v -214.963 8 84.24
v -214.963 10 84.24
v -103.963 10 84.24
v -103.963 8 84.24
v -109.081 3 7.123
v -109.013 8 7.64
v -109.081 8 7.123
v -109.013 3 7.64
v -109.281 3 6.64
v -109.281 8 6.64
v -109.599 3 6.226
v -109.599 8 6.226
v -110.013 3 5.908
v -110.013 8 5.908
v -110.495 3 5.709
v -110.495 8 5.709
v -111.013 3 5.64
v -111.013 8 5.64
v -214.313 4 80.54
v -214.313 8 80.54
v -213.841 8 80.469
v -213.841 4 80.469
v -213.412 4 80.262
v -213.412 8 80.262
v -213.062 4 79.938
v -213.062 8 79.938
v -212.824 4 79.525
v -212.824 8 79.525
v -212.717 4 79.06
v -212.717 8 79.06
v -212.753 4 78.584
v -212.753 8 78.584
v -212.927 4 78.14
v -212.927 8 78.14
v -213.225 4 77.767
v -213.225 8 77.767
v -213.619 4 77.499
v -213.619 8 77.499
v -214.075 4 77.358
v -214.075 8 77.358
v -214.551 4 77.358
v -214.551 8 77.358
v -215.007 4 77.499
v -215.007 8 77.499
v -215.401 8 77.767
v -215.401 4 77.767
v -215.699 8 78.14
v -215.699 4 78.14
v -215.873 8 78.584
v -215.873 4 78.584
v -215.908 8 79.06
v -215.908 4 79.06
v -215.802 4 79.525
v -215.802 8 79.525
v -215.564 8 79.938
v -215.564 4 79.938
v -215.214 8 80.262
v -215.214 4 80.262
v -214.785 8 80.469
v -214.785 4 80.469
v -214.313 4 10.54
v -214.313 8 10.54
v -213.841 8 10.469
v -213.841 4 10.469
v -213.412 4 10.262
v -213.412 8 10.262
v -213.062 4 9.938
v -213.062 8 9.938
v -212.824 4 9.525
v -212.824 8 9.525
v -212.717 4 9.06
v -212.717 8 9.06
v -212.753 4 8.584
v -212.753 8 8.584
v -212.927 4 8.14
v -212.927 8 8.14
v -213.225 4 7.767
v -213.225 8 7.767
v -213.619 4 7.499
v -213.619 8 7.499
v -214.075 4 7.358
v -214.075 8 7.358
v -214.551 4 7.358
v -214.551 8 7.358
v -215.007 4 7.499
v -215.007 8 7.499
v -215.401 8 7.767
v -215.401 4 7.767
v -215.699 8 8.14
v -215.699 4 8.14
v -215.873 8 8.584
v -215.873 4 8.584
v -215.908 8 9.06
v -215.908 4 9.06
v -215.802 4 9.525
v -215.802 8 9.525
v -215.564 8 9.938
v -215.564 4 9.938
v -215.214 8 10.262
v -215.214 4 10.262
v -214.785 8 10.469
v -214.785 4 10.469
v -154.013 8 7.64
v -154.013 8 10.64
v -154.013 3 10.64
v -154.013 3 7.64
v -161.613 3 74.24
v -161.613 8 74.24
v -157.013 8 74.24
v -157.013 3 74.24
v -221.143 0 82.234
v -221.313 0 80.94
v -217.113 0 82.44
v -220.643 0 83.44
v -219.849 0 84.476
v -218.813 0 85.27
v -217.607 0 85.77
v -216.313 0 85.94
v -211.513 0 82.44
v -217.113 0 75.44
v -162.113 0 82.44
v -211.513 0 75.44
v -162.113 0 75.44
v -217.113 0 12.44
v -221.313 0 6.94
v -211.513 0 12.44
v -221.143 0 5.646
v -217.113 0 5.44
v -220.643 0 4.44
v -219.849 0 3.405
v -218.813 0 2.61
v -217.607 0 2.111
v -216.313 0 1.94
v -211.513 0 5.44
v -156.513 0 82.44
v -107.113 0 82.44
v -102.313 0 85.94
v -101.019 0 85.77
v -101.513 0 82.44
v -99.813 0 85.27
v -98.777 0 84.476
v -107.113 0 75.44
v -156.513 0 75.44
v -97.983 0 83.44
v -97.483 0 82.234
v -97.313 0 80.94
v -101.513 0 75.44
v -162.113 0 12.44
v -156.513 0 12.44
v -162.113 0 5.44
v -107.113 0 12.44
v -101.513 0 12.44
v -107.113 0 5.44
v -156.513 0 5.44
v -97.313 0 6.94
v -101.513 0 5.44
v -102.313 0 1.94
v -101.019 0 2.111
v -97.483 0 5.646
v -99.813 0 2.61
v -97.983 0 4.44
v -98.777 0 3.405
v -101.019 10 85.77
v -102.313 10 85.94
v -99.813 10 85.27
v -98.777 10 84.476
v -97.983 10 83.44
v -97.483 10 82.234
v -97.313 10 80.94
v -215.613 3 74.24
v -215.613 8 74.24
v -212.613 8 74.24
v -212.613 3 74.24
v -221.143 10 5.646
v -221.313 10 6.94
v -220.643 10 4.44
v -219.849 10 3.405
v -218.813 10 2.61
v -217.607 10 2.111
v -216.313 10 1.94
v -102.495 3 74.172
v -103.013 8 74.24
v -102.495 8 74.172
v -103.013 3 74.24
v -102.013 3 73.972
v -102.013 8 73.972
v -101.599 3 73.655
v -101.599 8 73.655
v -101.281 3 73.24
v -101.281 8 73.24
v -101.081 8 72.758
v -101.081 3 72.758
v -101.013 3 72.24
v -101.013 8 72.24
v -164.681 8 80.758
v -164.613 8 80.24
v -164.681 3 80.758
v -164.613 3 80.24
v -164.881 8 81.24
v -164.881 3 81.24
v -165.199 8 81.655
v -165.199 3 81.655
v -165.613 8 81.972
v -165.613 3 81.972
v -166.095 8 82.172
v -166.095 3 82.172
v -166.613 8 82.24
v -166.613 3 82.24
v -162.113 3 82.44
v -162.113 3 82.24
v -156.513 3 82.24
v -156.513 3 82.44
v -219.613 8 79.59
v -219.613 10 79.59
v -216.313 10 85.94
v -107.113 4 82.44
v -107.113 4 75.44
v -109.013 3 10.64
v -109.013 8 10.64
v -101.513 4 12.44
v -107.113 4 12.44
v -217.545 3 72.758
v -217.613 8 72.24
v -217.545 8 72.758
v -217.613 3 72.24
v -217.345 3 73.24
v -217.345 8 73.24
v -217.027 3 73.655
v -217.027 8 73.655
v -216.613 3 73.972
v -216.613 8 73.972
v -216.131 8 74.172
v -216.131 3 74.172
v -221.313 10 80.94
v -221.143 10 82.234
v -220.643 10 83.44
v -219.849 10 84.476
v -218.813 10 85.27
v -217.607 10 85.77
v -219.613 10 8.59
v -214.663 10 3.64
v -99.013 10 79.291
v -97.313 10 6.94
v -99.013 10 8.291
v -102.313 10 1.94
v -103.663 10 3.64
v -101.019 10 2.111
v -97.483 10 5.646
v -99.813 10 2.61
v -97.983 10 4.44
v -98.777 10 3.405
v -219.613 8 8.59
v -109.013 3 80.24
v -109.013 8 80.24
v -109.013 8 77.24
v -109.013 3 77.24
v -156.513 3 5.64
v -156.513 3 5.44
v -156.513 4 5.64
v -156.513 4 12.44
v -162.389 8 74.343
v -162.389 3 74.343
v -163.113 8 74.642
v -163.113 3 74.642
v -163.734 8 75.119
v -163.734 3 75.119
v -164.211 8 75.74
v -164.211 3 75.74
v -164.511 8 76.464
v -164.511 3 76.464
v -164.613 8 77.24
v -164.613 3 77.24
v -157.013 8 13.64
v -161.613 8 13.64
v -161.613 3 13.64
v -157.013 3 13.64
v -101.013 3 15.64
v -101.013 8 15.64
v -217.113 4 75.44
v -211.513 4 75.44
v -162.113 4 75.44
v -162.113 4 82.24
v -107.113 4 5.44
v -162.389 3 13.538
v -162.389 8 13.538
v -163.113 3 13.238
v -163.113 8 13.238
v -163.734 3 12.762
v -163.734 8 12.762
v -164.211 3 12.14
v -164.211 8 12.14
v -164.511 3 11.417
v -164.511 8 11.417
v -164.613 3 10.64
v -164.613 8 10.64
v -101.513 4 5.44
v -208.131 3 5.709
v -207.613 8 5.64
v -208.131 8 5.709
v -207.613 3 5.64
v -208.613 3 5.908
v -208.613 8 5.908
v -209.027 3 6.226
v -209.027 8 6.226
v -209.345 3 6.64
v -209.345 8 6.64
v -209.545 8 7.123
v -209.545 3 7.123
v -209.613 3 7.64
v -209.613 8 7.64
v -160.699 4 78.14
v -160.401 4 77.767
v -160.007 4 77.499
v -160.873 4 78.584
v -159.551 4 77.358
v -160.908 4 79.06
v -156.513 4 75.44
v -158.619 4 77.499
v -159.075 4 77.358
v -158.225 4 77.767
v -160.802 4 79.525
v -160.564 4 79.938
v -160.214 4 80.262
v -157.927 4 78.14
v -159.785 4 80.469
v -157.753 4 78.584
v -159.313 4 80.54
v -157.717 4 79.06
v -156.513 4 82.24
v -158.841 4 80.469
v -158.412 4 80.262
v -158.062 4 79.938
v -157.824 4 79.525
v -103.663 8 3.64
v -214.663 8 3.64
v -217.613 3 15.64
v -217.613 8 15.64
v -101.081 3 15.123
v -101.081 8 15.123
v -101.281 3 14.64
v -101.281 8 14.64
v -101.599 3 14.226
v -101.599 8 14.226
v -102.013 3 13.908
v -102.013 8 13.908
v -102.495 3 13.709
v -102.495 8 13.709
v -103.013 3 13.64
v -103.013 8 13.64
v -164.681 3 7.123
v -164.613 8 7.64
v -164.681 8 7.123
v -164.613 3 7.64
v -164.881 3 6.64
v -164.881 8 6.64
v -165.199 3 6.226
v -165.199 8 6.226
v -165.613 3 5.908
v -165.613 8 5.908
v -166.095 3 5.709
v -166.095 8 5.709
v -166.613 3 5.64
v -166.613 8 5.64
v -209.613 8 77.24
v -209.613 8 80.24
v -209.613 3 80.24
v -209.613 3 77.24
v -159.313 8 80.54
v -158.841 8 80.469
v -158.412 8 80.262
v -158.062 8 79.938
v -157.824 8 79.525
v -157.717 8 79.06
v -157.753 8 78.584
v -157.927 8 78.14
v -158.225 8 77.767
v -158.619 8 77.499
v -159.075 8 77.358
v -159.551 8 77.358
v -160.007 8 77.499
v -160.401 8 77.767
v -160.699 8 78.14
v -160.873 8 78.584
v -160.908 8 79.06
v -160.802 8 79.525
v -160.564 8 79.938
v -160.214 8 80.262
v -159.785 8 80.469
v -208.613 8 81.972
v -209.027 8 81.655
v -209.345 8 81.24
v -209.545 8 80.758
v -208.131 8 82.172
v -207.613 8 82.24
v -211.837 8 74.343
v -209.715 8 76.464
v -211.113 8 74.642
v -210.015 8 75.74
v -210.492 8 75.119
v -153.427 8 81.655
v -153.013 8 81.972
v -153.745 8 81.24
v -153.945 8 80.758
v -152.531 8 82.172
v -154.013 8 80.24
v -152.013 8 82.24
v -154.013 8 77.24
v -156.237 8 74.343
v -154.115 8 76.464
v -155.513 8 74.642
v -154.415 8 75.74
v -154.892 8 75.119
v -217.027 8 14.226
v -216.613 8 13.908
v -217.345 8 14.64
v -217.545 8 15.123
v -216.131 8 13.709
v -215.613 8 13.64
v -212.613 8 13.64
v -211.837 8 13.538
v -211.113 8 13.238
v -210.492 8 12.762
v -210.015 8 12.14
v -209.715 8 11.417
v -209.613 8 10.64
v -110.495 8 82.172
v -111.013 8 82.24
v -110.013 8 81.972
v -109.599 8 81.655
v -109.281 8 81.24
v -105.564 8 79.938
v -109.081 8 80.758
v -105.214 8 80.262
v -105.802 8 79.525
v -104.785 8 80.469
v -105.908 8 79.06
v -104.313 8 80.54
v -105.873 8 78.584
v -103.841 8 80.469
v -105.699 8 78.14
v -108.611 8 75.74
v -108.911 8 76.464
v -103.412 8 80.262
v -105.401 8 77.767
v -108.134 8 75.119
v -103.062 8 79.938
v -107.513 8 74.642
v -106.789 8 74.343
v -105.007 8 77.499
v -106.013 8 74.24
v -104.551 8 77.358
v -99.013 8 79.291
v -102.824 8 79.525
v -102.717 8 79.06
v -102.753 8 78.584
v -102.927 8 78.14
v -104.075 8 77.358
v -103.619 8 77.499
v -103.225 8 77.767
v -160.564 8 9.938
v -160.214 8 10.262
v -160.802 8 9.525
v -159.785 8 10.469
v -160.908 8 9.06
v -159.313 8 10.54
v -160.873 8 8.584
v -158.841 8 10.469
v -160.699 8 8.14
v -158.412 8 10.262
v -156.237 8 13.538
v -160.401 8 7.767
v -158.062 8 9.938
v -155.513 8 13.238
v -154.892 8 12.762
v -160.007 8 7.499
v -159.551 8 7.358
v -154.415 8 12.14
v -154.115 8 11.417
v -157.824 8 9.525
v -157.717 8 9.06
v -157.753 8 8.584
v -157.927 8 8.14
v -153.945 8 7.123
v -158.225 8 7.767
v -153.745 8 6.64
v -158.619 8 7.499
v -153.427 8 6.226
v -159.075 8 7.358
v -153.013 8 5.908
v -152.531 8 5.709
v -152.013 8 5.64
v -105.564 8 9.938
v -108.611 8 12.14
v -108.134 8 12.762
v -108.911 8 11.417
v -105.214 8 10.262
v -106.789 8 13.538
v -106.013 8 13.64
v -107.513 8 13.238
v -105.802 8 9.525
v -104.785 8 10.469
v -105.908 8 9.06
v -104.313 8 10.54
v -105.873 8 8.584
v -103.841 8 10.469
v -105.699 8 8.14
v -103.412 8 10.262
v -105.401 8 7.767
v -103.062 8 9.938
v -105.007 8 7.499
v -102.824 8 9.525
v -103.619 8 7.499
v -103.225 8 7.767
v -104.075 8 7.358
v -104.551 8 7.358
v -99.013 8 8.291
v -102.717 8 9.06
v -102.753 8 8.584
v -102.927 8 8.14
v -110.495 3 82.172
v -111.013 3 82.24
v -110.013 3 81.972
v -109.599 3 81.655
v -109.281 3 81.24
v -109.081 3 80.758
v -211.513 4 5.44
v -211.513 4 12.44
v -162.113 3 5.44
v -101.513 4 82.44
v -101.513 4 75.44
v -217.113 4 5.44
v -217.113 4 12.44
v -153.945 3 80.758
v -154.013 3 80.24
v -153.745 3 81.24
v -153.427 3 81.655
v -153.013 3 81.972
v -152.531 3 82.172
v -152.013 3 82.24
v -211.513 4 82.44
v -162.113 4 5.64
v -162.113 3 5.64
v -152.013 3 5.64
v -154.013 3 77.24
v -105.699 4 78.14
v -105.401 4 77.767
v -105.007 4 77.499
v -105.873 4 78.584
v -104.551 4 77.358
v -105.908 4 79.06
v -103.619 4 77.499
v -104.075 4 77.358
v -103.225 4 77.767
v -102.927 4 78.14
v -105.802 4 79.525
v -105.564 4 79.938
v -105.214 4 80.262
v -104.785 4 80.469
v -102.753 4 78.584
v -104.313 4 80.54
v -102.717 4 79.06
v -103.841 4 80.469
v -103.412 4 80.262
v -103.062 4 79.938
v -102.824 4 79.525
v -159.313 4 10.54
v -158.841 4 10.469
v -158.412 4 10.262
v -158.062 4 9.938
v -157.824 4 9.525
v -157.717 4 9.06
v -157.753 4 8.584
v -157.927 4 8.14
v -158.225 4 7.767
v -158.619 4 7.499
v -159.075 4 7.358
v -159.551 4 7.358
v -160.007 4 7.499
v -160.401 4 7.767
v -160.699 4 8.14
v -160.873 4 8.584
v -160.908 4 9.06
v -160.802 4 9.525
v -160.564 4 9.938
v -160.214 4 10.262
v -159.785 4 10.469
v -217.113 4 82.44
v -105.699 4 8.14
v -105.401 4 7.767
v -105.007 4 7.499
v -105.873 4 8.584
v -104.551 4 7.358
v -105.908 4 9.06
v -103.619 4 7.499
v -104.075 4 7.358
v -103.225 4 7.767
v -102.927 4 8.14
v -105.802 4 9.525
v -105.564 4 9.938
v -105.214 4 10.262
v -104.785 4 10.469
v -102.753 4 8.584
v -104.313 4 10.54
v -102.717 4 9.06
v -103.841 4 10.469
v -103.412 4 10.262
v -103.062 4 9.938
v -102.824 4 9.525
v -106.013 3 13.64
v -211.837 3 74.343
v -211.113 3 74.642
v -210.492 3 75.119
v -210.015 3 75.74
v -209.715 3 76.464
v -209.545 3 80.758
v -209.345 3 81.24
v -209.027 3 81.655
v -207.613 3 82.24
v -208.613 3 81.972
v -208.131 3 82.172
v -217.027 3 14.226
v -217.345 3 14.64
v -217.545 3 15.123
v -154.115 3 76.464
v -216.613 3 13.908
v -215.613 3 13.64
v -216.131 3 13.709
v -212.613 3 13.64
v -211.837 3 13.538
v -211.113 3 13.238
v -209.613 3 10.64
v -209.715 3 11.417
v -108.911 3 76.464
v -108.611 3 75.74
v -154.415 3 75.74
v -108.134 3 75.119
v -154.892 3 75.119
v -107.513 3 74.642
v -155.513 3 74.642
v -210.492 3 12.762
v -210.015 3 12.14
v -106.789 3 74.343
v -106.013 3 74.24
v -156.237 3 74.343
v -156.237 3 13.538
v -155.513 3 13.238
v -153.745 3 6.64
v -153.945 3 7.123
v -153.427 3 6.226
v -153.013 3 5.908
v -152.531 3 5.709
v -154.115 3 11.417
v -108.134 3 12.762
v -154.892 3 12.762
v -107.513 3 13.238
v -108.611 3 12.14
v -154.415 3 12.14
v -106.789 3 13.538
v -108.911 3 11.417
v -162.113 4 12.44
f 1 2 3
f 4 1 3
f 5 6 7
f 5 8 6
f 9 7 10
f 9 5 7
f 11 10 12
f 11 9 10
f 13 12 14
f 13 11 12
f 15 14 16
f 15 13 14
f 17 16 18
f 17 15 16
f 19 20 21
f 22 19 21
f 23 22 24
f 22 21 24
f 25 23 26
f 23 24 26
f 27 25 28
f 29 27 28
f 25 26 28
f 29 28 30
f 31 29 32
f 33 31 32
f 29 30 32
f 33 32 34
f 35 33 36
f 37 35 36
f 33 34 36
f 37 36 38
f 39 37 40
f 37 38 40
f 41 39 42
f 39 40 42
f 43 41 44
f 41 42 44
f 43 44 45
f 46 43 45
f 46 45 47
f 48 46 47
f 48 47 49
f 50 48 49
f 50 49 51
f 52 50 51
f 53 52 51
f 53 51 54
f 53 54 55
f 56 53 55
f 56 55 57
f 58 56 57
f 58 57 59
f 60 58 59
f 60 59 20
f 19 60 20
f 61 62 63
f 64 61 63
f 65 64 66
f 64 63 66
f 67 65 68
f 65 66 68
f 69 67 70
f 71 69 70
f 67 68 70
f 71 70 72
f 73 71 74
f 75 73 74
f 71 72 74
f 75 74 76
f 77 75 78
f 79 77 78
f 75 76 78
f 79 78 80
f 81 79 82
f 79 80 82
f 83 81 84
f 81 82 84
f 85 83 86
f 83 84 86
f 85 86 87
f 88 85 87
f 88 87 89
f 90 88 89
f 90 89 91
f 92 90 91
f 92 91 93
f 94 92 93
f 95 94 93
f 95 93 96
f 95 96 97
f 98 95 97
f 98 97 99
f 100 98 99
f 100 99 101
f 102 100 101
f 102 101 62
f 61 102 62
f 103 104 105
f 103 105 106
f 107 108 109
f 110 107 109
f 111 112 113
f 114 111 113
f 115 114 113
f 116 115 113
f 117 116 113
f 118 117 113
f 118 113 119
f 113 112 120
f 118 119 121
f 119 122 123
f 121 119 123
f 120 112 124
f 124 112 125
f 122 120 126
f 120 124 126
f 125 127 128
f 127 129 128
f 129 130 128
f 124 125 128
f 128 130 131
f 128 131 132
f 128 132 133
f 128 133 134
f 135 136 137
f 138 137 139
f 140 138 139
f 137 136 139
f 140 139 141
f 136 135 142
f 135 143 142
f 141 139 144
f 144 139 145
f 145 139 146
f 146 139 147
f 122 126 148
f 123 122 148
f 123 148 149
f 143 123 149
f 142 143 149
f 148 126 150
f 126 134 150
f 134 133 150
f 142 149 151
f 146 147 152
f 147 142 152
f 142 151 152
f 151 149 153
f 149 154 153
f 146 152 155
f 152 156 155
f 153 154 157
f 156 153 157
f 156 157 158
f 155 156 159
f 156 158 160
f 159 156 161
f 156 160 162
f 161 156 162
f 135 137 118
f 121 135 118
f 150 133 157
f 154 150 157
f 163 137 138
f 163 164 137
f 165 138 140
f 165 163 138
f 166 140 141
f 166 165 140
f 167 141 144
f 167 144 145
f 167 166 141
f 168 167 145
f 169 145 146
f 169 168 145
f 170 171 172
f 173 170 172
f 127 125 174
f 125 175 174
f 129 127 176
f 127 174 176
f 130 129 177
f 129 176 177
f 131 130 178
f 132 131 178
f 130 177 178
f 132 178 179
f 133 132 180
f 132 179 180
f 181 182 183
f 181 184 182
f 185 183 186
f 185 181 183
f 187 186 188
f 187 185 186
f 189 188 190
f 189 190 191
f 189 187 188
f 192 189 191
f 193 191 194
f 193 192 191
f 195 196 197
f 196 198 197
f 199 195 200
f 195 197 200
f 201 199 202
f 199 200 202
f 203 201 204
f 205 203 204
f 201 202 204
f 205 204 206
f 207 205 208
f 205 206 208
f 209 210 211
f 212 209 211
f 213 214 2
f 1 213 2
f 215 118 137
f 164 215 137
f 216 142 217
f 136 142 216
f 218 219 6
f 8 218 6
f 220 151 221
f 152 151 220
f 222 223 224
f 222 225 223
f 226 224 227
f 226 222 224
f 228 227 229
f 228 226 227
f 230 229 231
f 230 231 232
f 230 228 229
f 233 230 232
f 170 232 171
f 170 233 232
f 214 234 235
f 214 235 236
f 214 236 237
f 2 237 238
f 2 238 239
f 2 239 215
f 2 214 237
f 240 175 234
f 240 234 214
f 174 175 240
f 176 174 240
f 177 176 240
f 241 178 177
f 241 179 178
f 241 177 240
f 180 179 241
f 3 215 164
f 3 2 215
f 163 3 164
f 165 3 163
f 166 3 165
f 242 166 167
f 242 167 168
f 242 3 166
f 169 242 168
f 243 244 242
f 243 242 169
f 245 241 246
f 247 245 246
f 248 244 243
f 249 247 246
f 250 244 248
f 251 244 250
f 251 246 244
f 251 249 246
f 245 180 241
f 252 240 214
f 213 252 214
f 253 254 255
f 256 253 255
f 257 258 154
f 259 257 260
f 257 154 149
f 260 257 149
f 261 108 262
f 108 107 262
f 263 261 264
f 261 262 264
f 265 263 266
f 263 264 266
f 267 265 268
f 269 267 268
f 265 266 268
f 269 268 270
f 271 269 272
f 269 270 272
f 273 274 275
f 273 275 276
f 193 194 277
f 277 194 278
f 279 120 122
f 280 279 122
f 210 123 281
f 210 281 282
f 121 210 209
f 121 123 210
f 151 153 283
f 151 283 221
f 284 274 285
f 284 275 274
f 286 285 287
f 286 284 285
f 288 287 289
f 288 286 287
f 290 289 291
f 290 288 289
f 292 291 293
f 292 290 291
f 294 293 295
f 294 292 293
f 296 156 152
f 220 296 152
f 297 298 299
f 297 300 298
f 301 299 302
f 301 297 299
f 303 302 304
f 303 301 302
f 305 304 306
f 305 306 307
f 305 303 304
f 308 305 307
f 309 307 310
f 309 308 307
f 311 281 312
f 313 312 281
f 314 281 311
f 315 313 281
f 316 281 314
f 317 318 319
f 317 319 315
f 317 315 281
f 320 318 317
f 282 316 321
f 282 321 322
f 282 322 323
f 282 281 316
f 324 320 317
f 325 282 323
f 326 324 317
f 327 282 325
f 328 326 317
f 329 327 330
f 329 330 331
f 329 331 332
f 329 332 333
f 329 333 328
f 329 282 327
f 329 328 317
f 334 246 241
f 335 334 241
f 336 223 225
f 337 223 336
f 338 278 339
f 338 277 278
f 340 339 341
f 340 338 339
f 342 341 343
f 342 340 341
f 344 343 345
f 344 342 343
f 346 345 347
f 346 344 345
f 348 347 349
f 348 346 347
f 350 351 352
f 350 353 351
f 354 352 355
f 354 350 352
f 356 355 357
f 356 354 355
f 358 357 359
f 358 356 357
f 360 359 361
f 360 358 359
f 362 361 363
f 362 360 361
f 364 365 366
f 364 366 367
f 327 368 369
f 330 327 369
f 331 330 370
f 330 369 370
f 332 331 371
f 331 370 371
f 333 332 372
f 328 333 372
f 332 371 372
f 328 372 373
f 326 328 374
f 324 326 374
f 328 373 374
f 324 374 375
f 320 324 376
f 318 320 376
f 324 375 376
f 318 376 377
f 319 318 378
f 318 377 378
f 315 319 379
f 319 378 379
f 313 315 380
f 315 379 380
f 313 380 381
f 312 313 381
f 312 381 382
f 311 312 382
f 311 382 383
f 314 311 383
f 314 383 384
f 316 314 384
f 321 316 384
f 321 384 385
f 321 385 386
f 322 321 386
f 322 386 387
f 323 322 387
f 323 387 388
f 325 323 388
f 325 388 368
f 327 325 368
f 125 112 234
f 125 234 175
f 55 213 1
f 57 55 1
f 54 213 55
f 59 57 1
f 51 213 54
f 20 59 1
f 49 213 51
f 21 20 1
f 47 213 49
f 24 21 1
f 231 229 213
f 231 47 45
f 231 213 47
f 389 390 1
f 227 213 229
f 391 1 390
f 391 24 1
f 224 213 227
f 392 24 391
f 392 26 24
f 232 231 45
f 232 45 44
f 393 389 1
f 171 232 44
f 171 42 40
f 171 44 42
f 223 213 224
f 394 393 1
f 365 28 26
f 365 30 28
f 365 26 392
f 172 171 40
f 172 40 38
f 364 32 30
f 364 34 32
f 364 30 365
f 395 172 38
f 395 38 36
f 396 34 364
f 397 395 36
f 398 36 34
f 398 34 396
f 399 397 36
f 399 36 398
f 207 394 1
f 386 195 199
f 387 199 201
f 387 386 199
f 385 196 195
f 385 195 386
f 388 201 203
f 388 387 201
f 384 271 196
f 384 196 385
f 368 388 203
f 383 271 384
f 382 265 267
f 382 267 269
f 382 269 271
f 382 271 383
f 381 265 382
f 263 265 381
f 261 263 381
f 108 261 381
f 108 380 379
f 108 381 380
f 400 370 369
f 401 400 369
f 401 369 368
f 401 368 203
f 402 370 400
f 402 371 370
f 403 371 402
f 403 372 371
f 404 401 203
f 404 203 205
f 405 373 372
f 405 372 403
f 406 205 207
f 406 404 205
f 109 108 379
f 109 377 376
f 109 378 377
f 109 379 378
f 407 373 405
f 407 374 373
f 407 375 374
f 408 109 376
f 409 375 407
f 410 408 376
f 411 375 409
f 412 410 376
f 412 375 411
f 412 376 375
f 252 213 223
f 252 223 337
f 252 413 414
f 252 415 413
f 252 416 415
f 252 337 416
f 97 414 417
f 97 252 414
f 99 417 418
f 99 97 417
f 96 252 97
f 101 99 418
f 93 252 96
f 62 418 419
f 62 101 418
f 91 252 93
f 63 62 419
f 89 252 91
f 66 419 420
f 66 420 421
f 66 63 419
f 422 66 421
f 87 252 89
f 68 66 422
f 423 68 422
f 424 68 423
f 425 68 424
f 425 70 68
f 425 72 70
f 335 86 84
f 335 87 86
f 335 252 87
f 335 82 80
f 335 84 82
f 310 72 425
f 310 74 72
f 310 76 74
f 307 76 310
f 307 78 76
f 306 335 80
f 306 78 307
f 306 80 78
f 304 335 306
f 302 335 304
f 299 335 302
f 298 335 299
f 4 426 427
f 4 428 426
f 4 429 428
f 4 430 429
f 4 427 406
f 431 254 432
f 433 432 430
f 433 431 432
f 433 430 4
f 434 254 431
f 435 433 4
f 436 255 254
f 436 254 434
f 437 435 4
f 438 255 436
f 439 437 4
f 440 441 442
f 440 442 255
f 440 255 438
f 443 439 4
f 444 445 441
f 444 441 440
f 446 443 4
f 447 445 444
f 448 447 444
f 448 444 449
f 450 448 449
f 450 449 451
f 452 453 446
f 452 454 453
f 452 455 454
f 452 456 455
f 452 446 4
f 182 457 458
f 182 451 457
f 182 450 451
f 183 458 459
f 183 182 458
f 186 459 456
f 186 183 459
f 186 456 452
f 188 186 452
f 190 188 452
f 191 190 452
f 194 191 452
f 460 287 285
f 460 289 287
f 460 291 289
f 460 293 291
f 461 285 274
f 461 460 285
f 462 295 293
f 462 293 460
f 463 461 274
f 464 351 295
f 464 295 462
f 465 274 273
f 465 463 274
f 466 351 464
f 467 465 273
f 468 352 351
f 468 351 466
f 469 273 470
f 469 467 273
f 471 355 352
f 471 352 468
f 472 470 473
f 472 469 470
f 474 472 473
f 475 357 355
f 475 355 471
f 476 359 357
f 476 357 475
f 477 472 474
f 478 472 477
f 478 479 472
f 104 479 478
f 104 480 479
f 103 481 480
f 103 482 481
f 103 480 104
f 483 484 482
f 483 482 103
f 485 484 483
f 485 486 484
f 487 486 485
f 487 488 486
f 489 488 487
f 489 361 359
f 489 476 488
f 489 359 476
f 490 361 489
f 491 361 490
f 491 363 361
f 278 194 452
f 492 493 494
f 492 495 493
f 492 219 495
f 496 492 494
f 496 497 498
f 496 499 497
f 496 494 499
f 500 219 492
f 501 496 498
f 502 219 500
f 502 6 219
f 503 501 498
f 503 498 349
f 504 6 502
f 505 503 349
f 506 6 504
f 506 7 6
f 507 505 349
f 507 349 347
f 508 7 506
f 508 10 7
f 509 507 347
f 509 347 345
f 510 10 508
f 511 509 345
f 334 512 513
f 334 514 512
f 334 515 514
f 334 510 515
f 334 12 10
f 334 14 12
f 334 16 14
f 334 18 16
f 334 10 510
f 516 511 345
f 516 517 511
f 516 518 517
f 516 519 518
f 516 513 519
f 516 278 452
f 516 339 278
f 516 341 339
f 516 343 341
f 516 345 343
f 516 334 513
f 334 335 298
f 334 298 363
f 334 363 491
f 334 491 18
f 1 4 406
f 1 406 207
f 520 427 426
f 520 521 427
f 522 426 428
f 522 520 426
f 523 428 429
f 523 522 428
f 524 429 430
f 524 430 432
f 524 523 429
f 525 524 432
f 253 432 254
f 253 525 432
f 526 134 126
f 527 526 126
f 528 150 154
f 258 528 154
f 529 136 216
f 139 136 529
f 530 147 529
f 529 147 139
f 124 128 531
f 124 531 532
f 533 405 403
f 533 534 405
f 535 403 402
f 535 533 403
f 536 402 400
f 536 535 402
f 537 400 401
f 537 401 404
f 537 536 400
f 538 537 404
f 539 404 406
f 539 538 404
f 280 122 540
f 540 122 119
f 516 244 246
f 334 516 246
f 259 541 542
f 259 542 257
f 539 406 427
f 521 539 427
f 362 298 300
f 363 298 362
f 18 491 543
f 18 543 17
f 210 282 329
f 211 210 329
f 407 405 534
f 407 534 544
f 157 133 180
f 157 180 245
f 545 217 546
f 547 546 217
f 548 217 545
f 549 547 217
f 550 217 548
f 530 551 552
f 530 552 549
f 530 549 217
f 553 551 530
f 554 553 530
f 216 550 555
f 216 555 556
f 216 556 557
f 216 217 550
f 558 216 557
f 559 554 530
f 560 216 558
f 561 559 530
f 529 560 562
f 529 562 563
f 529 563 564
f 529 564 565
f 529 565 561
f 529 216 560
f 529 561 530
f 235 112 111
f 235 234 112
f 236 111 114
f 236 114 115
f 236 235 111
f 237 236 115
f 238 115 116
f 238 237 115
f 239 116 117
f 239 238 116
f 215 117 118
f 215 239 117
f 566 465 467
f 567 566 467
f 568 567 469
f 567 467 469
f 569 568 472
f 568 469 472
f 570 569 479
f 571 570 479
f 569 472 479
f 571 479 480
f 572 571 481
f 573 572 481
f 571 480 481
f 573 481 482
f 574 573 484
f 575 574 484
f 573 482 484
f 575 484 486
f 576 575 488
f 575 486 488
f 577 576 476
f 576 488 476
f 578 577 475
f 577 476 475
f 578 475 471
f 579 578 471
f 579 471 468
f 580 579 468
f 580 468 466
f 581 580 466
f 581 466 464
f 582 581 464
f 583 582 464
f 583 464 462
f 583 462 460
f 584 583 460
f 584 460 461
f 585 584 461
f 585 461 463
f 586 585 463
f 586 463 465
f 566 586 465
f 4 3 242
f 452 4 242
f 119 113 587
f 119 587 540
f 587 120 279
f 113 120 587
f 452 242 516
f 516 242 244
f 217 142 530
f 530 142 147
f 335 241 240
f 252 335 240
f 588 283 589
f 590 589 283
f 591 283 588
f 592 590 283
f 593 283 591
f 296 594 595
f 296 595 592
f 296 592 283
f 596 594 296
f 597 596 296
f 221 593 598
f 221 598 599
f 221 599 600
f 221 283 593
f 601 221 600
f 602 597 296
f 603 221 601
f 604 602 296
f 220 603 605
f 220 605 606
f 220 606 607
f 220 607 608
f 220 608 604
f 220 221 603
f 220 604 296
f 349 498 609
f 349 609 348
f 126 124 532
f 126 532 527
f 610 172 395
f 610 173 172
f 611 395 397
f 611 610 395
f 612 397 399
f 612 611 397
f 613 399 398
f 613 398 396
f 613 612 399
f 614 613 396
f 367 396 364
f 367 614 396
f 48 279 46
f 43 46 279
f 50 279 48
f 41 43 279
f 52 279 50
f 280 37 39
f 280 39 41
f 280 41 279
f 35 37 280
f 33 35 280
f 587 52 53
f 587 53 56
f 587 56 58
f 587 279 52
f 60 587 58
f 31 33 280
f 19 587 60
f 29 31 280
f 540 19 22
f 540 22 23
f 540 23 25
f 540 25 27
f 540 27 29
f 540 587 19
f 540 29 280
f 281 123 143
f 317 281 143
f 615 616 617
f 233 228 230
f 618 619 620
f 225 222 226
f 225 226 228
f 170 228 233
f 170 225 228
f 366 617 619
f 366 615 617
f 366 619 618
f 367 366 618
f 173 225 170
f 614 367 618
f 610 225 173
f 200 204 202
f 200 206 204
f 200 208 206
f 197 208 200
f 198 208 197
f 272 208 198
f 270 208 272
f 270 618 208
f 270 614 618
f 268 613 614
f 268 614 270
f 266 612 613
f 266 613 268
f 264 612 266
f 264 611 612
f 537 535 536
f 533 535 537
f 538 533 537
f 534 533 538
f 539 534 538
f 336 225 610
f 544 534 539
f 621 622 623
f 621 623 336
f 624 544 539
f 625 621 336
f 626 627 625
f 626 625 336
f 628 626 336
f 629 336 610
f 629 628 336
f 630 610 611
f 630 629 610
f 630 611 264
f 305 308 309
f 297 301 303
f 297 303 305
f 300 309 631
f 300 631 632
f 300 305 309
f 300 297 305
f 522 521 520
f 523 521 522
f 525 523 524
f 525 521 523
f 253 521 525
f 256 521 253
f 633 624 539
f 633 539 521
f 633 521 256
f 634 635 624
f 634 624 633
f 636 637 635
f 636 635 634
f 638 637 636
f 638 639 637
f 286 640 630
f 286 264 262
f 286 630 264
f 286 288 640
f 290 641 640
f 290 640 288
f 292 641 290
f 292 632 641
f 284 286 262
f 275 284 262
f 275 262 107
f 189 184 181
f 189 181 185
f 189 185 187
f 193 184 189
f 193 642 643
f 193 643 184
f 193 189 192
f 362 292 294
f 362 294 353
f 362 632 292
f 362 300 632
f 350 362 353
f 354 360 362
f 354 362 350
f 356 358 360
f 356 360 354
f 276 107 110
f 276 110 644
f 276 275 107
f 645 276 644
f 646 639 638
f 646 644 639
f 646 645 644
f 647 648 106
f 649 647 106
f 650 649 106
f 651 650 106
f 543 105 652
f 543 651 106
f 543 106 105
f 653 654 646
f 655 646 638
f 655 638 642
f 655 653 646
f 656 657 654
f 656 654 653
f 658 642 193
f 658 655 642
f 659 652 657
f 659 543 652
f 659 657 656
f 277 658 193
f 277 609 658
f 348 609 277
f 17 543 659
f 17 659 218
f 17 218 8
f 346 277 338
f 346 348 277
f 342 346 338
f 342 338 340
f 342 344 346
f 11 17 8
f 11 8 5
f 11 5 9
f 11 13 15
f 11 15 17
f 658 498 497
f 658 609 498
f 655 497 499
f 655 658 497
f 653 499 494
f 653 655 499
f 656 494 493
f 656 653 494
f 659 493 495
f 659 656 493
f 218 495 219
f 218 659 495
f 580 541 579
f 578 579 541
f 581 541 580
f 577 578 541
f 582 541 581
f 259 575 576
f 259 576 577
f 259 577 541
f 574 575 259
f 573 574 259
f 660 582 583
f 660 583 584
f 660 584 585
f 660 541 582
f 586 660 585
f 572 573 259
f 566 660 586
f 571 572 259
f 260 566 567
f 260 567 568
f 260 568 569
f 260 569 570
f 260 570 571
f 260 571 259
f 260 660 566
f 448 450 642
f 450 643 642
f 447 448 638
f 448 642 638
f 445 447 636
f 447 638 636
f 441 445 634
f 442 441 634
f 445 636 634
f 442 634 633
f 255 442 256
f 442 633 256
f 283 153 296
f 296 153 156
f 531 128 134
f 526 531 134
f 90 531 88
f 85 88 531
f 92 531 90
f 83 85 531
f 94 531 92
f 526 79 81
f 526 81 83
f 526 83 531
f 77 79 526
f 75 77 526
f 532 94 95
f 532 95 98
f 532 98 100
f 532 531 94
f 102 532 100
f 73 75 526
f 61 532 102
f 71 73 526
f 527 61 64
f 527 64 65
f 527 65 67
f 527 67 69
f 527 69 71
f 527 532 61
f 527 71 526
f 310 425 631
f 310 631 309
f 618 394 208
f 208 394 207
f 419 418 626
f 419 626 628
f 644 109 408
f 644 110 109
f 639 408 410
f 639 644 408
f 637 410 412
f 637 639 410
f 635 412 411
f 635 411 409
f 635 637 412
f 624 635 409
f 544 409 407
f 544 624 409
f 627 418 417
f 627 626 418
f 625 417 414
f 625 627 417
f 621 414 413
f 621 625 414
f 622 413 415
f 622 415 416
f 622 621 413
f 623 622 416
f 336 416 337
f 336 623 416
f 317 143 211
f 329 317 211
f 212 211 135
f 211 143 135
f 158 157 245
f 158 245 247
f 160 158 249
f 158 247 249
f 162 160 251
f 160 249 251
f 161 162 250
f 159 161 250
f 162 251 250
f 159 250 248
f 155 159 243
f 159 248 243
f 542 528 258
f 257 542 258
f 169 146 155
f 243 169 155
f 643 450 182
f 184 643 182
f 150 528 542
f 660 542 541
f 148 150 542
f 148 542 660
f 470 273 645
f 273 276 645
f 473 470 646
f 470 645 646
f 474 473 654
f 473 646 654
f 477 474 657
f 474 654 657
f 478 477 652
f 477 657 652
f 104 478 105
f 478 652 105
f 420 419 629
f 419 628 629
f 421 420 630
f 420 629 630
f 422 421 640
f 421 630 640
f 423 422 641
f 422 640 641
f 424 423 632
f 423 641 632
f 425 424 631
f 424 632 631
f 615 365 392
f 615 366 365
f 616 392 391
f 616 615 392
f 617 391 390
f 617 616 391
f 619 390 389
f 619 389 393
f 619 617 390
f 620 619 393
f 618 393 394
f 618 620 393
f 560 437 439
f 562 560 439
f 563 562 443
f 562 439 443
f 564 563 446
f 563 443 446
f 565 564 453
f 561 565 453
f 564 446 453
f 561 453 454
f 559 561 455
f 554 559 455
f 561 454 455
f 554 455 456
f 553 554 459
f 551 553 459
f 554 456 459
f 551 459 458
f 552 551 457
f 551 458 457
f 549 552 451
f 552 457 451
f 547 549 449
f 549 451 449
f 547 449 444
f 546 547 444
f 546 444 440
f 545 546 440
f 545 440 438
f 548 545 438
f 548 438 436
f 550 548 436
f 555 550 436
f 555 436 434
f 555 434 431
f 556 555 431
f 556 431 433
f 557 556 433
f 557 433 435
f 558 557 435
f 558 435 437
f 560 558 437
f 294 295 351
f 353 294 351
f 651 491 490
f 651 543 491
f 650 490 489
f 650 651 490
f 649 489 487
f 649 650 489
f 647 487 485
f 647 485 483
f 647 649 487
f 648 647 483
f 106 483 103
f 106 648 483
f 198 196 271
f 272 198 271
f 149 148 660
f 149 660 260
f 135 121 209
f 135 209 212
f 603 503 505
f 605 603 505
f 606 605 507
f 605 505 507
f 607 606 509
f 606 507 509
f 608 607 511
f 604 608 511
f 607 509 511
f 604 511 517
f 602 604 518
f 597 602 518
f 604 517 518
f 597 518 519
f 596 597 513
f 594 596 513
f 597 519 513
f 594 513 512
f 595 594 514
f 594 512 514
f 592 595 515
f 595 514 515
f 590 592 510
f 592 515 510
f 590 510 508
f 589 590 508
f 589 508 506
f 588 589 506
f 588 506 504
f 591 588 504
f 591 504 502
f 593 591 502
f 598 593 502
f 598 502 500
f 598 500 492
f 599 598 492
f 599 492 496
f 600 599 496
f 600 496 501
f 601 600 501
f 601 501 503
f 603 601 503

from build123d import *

# Parameters (mm, degrees)
SKETCH1_W           = 124
SKETCH1_H           = 84
BOSS_EXTRUDE1_DEPTH = 10
CUT_EXTRUDE1_DEPTH  = 2
SKETCH3_W           = 120.6
SKETCH3_H           = 60.6
CUT_EXTRUDE2_DEPTH  = 5
SKETCH4_W           = 45
SKETCH4_H           = 10
CUT_EXTRUDE3_DEPTH  = 5
FILLET1_R           = 3
FILLET2_R           = 5
SKETCH5_R           = 1.6
CUT_EXTRUDE4_DEPTH  = 238.548265663
SKETCH7_W           = 5.6
SKETCH7_H           = 7
CUT_EXTRUDE5_DEPTH  = 4
SKETCH8_W           = 100.6
SKETCH8_H           = 2
SKETCH8_W_2         = 2
SKETCH8_H_2         = 60.6
BOSS_EXTRUDE2_DEPTH = 5
FILLET3_R           = 2


with BuildPart() as part:
    # Sketch1 → Boss-Extrude1 (new body)
    with BuildSketch(Plane(origin=(0, 0, 0), x_dir=(1, 0, 0), z_dir=(0, 1, 0))):
        with Locations((-159.312972905, -43.940366204)):
            Rectangle(SKETCH1_W, SKETCH1_H)
    extrude(amount=BOSS_EXTRUDE1_DEPTH)

    # Sketch2 → Cut-Extrude1 (cut)
    with BuildSketch(Plane(origin=(0, 10, 0), x_dir=(1, 0, 0), z_dir=(0, 1, 0))):
        Polygon((-214.663225437, -3.640366204), (-219.612972905, -8.590113673), (-219.612972905, -79.590113673), (-214.962720373, -84.240366204), (-103.962720373, -84.240366204), (-99.012972905, -79.290618736), (-99.012972905, -8.290618736), (-103.663225437, -3.640366204), align=None)
    extrude(amount=-CUT_EXTRUDE1_DEPTH, mode=Mode.SUBTRACT)

    # Sketch3 → Cut-Extrude2 (cut)
    with BuildSketch(Plane(origin=(0, 8, 0), x_dir=(1, 0, 0), z_dir=(0, 1, 0))):
        with Locations((-159.312972905, -43.940366204)):
            Rectangle(SKETCH3_W, SKETCH3_H)
    extrude(amount=-CUT_EXTRUDE2_DEPTH, mode=Mode.SUBTRACT)

    # Sketch4 → Cut-Extrude3 (cut)
    with BuildSketch(Plane(origin=(0, 8, 0), x_dir=(1, 0, 0), z_dir=(0, 1, 0))):
        with Locations((-187.112972905, -8.640366204)):
            Rectangle(SKETCH4_W, SKETCH4_H)
        with Locations((-131.512972905, -8.640366204)):
            Rectangle(SKETCH4_W, SKETCH4_H)
        with Locations((-131.512972905, -79.240366204)):
            Rectangle(SKETCH4_W, SKETCH4_H)
        with Locations((-187.112972905, -79.240366204)):
            Rectangle(SKETCH4_W, SKETCH4_H)
    extrude(amount=-CUT_EXTRUDE3_DEPTH, mode=Mode.SUBTRACT)

    # Fillet1
    fillet1_edges = [part.edges().sort_by_distance(p)[0] for p in [
        (-209.612972905, 5.5, 74.240366204),
        (-164.612972905, 5.5, 74.240366204),
        (-109.012972905, 5.5, 74.240366204),
        (-154.012972905, 5.5, 74.240366204),
        (-154.012972905, 5.5, 13.640366204),
        (-109.012972905, 5.5, 13.640366204),
        (-209.612972905, 5.5, 13.640366204),
        (-164.612972905, 5.5, 13.640366204),
    ]]
    fillet(fillet1_edges, radius=FILLET1_R)

    # Fillet2
    fillet2_edges = [part.edges().sort_by_distance(p)[0] for p in [
        (-221.312972905, 5, 1.940366204),
        (-97.312972905, 5, 1.940366204),
        (-97.312972905, 5, 85.940366204),
        (-221.312972905, 5, 85.940366204),
    ]]
    fillet(fillet2_edges, radius=FILLET2_R)

    # Sketch5 → Cut-Extrude4 (cut, through all)
    with BuildSketch(Plane(origin=(0, 8, 0), x_dir=(1, 0, 0), z_dir=(0, 1, 0))):
        with Locations(Location((-214.312972905, -8.940366204, 0), (0, 0, 270))):
            Circle(SKETCH5_R)
        with Locations(Location((-159.312972905, -8.940366204, 0), (0, 0, 270))):
            Circle(SKETCH5_R)
        with Locations(Location((-104.312972905, -8.940366204, 0), (0, 0, 270))):
            Circle(SKETCH5_R)
        with Locations(Location((-104.312972905, -78.940366204, 0), (0, 0, 270))):
            Circle(SKETCH5_R)
        with Locations(Location((-159.312972905, -78.940366204, 0), (0, 0, 270))):
            Circle(SKETCH5_R)
        with Locations(Location((-214.312972905, -78.940366204, 0), (0, 0, 270))):
            Circle(SKETCH5_R)
    extrude(amount=-CUT_EXTRUDE4_DEPTH, mode=Mode.SUBTRACT)

    # Sketch7 → Cut-Extrude5 (cut)
    with BuildSketch(Plane.XZ):
        with Locations((-104.312972905, 8.940366204)):
            Rectangle(SKETCH7_W, SKETCH7_H)
        with Locations((-159.312972905, 8.940366204)):
            Rectangle(SKETCH7_W, SKETCH7_H)
        with Locations((-214.312972905, 8.940366204)):
            Rectangle(SKETCH7_W, SKETCH7_H)
        with Locations((-214.312972905, 78.940366204)):
            Rectangle(SKETCH7_W, SKETCH7_H)
        with Locations((-159.312972905, 78.940366204)):
            Rectangle(SKETCH7_W, SKETCH7_H)
        with Locations((-104.312972905, 78.940366204)):
            Rectangle(SKETCH7_W, SKETCH7_H)
    extrude(amount=-CUT_EXTRUDE5_DEPTH, mode=Mode.SUBTRACT)

    # Sketch8 → Boss-Extrude2 (add)
    with BuildSketch(Plane(origin=(0, 8, 0), x_dir=(1, 0, 0), z_dir=(0, 1, 0))):
        with Locations((-159.312972905, -83.240366204)):
            Rectangle(SKETCH8_W, SKETCH8_H)
        with Locations((-218.612972905, -43.940366204)):
            Rectangle(SKETCH8_W_2, SKETCH8_H_2)
        with Locations((-159.312972905, -4.640366204)):
            Rectangle(SKETCH8_W, SKETCH8_H)
        with Locations((-100.012972905, -43.940366204)):
            Rectangle(SKETCH8_W_2, SKETCH8_H_2)
    extrude(amount=-BOSS_EXTRUDE2_DEPTH)

    # Fillet3
    fillet3_edges = [part.edges().sort_by_distance(p)[0] for p in [
        (-209.612972905, 5.5, 82.240366204),
        (-109.012972905, 5.5, 82.240366204),
        (-154.012972905, 5.5, 82.240366204),
        (-164.612972905, 5.5, 82.240366204),
        (-217.612972905, 5.5, 13.640366204),
        (-217.612972905, 5.5, 74.240366204),
        (-109.012972905, 5.5, 5.640366204),
        (-209.612972905, 5.5, 5.640366204),
        (-164.612972905, 5.5, 5.640366204),
        (-154.012972905, 5.5, 5.640366204),
        (-101.012972905, 5.5, 74.240366204),
        (-101.012972905, 5.5, 13.640366204),
    ]]
    fillet(fillet3_edges, radius=FILLET3_R)


solid = part.part
